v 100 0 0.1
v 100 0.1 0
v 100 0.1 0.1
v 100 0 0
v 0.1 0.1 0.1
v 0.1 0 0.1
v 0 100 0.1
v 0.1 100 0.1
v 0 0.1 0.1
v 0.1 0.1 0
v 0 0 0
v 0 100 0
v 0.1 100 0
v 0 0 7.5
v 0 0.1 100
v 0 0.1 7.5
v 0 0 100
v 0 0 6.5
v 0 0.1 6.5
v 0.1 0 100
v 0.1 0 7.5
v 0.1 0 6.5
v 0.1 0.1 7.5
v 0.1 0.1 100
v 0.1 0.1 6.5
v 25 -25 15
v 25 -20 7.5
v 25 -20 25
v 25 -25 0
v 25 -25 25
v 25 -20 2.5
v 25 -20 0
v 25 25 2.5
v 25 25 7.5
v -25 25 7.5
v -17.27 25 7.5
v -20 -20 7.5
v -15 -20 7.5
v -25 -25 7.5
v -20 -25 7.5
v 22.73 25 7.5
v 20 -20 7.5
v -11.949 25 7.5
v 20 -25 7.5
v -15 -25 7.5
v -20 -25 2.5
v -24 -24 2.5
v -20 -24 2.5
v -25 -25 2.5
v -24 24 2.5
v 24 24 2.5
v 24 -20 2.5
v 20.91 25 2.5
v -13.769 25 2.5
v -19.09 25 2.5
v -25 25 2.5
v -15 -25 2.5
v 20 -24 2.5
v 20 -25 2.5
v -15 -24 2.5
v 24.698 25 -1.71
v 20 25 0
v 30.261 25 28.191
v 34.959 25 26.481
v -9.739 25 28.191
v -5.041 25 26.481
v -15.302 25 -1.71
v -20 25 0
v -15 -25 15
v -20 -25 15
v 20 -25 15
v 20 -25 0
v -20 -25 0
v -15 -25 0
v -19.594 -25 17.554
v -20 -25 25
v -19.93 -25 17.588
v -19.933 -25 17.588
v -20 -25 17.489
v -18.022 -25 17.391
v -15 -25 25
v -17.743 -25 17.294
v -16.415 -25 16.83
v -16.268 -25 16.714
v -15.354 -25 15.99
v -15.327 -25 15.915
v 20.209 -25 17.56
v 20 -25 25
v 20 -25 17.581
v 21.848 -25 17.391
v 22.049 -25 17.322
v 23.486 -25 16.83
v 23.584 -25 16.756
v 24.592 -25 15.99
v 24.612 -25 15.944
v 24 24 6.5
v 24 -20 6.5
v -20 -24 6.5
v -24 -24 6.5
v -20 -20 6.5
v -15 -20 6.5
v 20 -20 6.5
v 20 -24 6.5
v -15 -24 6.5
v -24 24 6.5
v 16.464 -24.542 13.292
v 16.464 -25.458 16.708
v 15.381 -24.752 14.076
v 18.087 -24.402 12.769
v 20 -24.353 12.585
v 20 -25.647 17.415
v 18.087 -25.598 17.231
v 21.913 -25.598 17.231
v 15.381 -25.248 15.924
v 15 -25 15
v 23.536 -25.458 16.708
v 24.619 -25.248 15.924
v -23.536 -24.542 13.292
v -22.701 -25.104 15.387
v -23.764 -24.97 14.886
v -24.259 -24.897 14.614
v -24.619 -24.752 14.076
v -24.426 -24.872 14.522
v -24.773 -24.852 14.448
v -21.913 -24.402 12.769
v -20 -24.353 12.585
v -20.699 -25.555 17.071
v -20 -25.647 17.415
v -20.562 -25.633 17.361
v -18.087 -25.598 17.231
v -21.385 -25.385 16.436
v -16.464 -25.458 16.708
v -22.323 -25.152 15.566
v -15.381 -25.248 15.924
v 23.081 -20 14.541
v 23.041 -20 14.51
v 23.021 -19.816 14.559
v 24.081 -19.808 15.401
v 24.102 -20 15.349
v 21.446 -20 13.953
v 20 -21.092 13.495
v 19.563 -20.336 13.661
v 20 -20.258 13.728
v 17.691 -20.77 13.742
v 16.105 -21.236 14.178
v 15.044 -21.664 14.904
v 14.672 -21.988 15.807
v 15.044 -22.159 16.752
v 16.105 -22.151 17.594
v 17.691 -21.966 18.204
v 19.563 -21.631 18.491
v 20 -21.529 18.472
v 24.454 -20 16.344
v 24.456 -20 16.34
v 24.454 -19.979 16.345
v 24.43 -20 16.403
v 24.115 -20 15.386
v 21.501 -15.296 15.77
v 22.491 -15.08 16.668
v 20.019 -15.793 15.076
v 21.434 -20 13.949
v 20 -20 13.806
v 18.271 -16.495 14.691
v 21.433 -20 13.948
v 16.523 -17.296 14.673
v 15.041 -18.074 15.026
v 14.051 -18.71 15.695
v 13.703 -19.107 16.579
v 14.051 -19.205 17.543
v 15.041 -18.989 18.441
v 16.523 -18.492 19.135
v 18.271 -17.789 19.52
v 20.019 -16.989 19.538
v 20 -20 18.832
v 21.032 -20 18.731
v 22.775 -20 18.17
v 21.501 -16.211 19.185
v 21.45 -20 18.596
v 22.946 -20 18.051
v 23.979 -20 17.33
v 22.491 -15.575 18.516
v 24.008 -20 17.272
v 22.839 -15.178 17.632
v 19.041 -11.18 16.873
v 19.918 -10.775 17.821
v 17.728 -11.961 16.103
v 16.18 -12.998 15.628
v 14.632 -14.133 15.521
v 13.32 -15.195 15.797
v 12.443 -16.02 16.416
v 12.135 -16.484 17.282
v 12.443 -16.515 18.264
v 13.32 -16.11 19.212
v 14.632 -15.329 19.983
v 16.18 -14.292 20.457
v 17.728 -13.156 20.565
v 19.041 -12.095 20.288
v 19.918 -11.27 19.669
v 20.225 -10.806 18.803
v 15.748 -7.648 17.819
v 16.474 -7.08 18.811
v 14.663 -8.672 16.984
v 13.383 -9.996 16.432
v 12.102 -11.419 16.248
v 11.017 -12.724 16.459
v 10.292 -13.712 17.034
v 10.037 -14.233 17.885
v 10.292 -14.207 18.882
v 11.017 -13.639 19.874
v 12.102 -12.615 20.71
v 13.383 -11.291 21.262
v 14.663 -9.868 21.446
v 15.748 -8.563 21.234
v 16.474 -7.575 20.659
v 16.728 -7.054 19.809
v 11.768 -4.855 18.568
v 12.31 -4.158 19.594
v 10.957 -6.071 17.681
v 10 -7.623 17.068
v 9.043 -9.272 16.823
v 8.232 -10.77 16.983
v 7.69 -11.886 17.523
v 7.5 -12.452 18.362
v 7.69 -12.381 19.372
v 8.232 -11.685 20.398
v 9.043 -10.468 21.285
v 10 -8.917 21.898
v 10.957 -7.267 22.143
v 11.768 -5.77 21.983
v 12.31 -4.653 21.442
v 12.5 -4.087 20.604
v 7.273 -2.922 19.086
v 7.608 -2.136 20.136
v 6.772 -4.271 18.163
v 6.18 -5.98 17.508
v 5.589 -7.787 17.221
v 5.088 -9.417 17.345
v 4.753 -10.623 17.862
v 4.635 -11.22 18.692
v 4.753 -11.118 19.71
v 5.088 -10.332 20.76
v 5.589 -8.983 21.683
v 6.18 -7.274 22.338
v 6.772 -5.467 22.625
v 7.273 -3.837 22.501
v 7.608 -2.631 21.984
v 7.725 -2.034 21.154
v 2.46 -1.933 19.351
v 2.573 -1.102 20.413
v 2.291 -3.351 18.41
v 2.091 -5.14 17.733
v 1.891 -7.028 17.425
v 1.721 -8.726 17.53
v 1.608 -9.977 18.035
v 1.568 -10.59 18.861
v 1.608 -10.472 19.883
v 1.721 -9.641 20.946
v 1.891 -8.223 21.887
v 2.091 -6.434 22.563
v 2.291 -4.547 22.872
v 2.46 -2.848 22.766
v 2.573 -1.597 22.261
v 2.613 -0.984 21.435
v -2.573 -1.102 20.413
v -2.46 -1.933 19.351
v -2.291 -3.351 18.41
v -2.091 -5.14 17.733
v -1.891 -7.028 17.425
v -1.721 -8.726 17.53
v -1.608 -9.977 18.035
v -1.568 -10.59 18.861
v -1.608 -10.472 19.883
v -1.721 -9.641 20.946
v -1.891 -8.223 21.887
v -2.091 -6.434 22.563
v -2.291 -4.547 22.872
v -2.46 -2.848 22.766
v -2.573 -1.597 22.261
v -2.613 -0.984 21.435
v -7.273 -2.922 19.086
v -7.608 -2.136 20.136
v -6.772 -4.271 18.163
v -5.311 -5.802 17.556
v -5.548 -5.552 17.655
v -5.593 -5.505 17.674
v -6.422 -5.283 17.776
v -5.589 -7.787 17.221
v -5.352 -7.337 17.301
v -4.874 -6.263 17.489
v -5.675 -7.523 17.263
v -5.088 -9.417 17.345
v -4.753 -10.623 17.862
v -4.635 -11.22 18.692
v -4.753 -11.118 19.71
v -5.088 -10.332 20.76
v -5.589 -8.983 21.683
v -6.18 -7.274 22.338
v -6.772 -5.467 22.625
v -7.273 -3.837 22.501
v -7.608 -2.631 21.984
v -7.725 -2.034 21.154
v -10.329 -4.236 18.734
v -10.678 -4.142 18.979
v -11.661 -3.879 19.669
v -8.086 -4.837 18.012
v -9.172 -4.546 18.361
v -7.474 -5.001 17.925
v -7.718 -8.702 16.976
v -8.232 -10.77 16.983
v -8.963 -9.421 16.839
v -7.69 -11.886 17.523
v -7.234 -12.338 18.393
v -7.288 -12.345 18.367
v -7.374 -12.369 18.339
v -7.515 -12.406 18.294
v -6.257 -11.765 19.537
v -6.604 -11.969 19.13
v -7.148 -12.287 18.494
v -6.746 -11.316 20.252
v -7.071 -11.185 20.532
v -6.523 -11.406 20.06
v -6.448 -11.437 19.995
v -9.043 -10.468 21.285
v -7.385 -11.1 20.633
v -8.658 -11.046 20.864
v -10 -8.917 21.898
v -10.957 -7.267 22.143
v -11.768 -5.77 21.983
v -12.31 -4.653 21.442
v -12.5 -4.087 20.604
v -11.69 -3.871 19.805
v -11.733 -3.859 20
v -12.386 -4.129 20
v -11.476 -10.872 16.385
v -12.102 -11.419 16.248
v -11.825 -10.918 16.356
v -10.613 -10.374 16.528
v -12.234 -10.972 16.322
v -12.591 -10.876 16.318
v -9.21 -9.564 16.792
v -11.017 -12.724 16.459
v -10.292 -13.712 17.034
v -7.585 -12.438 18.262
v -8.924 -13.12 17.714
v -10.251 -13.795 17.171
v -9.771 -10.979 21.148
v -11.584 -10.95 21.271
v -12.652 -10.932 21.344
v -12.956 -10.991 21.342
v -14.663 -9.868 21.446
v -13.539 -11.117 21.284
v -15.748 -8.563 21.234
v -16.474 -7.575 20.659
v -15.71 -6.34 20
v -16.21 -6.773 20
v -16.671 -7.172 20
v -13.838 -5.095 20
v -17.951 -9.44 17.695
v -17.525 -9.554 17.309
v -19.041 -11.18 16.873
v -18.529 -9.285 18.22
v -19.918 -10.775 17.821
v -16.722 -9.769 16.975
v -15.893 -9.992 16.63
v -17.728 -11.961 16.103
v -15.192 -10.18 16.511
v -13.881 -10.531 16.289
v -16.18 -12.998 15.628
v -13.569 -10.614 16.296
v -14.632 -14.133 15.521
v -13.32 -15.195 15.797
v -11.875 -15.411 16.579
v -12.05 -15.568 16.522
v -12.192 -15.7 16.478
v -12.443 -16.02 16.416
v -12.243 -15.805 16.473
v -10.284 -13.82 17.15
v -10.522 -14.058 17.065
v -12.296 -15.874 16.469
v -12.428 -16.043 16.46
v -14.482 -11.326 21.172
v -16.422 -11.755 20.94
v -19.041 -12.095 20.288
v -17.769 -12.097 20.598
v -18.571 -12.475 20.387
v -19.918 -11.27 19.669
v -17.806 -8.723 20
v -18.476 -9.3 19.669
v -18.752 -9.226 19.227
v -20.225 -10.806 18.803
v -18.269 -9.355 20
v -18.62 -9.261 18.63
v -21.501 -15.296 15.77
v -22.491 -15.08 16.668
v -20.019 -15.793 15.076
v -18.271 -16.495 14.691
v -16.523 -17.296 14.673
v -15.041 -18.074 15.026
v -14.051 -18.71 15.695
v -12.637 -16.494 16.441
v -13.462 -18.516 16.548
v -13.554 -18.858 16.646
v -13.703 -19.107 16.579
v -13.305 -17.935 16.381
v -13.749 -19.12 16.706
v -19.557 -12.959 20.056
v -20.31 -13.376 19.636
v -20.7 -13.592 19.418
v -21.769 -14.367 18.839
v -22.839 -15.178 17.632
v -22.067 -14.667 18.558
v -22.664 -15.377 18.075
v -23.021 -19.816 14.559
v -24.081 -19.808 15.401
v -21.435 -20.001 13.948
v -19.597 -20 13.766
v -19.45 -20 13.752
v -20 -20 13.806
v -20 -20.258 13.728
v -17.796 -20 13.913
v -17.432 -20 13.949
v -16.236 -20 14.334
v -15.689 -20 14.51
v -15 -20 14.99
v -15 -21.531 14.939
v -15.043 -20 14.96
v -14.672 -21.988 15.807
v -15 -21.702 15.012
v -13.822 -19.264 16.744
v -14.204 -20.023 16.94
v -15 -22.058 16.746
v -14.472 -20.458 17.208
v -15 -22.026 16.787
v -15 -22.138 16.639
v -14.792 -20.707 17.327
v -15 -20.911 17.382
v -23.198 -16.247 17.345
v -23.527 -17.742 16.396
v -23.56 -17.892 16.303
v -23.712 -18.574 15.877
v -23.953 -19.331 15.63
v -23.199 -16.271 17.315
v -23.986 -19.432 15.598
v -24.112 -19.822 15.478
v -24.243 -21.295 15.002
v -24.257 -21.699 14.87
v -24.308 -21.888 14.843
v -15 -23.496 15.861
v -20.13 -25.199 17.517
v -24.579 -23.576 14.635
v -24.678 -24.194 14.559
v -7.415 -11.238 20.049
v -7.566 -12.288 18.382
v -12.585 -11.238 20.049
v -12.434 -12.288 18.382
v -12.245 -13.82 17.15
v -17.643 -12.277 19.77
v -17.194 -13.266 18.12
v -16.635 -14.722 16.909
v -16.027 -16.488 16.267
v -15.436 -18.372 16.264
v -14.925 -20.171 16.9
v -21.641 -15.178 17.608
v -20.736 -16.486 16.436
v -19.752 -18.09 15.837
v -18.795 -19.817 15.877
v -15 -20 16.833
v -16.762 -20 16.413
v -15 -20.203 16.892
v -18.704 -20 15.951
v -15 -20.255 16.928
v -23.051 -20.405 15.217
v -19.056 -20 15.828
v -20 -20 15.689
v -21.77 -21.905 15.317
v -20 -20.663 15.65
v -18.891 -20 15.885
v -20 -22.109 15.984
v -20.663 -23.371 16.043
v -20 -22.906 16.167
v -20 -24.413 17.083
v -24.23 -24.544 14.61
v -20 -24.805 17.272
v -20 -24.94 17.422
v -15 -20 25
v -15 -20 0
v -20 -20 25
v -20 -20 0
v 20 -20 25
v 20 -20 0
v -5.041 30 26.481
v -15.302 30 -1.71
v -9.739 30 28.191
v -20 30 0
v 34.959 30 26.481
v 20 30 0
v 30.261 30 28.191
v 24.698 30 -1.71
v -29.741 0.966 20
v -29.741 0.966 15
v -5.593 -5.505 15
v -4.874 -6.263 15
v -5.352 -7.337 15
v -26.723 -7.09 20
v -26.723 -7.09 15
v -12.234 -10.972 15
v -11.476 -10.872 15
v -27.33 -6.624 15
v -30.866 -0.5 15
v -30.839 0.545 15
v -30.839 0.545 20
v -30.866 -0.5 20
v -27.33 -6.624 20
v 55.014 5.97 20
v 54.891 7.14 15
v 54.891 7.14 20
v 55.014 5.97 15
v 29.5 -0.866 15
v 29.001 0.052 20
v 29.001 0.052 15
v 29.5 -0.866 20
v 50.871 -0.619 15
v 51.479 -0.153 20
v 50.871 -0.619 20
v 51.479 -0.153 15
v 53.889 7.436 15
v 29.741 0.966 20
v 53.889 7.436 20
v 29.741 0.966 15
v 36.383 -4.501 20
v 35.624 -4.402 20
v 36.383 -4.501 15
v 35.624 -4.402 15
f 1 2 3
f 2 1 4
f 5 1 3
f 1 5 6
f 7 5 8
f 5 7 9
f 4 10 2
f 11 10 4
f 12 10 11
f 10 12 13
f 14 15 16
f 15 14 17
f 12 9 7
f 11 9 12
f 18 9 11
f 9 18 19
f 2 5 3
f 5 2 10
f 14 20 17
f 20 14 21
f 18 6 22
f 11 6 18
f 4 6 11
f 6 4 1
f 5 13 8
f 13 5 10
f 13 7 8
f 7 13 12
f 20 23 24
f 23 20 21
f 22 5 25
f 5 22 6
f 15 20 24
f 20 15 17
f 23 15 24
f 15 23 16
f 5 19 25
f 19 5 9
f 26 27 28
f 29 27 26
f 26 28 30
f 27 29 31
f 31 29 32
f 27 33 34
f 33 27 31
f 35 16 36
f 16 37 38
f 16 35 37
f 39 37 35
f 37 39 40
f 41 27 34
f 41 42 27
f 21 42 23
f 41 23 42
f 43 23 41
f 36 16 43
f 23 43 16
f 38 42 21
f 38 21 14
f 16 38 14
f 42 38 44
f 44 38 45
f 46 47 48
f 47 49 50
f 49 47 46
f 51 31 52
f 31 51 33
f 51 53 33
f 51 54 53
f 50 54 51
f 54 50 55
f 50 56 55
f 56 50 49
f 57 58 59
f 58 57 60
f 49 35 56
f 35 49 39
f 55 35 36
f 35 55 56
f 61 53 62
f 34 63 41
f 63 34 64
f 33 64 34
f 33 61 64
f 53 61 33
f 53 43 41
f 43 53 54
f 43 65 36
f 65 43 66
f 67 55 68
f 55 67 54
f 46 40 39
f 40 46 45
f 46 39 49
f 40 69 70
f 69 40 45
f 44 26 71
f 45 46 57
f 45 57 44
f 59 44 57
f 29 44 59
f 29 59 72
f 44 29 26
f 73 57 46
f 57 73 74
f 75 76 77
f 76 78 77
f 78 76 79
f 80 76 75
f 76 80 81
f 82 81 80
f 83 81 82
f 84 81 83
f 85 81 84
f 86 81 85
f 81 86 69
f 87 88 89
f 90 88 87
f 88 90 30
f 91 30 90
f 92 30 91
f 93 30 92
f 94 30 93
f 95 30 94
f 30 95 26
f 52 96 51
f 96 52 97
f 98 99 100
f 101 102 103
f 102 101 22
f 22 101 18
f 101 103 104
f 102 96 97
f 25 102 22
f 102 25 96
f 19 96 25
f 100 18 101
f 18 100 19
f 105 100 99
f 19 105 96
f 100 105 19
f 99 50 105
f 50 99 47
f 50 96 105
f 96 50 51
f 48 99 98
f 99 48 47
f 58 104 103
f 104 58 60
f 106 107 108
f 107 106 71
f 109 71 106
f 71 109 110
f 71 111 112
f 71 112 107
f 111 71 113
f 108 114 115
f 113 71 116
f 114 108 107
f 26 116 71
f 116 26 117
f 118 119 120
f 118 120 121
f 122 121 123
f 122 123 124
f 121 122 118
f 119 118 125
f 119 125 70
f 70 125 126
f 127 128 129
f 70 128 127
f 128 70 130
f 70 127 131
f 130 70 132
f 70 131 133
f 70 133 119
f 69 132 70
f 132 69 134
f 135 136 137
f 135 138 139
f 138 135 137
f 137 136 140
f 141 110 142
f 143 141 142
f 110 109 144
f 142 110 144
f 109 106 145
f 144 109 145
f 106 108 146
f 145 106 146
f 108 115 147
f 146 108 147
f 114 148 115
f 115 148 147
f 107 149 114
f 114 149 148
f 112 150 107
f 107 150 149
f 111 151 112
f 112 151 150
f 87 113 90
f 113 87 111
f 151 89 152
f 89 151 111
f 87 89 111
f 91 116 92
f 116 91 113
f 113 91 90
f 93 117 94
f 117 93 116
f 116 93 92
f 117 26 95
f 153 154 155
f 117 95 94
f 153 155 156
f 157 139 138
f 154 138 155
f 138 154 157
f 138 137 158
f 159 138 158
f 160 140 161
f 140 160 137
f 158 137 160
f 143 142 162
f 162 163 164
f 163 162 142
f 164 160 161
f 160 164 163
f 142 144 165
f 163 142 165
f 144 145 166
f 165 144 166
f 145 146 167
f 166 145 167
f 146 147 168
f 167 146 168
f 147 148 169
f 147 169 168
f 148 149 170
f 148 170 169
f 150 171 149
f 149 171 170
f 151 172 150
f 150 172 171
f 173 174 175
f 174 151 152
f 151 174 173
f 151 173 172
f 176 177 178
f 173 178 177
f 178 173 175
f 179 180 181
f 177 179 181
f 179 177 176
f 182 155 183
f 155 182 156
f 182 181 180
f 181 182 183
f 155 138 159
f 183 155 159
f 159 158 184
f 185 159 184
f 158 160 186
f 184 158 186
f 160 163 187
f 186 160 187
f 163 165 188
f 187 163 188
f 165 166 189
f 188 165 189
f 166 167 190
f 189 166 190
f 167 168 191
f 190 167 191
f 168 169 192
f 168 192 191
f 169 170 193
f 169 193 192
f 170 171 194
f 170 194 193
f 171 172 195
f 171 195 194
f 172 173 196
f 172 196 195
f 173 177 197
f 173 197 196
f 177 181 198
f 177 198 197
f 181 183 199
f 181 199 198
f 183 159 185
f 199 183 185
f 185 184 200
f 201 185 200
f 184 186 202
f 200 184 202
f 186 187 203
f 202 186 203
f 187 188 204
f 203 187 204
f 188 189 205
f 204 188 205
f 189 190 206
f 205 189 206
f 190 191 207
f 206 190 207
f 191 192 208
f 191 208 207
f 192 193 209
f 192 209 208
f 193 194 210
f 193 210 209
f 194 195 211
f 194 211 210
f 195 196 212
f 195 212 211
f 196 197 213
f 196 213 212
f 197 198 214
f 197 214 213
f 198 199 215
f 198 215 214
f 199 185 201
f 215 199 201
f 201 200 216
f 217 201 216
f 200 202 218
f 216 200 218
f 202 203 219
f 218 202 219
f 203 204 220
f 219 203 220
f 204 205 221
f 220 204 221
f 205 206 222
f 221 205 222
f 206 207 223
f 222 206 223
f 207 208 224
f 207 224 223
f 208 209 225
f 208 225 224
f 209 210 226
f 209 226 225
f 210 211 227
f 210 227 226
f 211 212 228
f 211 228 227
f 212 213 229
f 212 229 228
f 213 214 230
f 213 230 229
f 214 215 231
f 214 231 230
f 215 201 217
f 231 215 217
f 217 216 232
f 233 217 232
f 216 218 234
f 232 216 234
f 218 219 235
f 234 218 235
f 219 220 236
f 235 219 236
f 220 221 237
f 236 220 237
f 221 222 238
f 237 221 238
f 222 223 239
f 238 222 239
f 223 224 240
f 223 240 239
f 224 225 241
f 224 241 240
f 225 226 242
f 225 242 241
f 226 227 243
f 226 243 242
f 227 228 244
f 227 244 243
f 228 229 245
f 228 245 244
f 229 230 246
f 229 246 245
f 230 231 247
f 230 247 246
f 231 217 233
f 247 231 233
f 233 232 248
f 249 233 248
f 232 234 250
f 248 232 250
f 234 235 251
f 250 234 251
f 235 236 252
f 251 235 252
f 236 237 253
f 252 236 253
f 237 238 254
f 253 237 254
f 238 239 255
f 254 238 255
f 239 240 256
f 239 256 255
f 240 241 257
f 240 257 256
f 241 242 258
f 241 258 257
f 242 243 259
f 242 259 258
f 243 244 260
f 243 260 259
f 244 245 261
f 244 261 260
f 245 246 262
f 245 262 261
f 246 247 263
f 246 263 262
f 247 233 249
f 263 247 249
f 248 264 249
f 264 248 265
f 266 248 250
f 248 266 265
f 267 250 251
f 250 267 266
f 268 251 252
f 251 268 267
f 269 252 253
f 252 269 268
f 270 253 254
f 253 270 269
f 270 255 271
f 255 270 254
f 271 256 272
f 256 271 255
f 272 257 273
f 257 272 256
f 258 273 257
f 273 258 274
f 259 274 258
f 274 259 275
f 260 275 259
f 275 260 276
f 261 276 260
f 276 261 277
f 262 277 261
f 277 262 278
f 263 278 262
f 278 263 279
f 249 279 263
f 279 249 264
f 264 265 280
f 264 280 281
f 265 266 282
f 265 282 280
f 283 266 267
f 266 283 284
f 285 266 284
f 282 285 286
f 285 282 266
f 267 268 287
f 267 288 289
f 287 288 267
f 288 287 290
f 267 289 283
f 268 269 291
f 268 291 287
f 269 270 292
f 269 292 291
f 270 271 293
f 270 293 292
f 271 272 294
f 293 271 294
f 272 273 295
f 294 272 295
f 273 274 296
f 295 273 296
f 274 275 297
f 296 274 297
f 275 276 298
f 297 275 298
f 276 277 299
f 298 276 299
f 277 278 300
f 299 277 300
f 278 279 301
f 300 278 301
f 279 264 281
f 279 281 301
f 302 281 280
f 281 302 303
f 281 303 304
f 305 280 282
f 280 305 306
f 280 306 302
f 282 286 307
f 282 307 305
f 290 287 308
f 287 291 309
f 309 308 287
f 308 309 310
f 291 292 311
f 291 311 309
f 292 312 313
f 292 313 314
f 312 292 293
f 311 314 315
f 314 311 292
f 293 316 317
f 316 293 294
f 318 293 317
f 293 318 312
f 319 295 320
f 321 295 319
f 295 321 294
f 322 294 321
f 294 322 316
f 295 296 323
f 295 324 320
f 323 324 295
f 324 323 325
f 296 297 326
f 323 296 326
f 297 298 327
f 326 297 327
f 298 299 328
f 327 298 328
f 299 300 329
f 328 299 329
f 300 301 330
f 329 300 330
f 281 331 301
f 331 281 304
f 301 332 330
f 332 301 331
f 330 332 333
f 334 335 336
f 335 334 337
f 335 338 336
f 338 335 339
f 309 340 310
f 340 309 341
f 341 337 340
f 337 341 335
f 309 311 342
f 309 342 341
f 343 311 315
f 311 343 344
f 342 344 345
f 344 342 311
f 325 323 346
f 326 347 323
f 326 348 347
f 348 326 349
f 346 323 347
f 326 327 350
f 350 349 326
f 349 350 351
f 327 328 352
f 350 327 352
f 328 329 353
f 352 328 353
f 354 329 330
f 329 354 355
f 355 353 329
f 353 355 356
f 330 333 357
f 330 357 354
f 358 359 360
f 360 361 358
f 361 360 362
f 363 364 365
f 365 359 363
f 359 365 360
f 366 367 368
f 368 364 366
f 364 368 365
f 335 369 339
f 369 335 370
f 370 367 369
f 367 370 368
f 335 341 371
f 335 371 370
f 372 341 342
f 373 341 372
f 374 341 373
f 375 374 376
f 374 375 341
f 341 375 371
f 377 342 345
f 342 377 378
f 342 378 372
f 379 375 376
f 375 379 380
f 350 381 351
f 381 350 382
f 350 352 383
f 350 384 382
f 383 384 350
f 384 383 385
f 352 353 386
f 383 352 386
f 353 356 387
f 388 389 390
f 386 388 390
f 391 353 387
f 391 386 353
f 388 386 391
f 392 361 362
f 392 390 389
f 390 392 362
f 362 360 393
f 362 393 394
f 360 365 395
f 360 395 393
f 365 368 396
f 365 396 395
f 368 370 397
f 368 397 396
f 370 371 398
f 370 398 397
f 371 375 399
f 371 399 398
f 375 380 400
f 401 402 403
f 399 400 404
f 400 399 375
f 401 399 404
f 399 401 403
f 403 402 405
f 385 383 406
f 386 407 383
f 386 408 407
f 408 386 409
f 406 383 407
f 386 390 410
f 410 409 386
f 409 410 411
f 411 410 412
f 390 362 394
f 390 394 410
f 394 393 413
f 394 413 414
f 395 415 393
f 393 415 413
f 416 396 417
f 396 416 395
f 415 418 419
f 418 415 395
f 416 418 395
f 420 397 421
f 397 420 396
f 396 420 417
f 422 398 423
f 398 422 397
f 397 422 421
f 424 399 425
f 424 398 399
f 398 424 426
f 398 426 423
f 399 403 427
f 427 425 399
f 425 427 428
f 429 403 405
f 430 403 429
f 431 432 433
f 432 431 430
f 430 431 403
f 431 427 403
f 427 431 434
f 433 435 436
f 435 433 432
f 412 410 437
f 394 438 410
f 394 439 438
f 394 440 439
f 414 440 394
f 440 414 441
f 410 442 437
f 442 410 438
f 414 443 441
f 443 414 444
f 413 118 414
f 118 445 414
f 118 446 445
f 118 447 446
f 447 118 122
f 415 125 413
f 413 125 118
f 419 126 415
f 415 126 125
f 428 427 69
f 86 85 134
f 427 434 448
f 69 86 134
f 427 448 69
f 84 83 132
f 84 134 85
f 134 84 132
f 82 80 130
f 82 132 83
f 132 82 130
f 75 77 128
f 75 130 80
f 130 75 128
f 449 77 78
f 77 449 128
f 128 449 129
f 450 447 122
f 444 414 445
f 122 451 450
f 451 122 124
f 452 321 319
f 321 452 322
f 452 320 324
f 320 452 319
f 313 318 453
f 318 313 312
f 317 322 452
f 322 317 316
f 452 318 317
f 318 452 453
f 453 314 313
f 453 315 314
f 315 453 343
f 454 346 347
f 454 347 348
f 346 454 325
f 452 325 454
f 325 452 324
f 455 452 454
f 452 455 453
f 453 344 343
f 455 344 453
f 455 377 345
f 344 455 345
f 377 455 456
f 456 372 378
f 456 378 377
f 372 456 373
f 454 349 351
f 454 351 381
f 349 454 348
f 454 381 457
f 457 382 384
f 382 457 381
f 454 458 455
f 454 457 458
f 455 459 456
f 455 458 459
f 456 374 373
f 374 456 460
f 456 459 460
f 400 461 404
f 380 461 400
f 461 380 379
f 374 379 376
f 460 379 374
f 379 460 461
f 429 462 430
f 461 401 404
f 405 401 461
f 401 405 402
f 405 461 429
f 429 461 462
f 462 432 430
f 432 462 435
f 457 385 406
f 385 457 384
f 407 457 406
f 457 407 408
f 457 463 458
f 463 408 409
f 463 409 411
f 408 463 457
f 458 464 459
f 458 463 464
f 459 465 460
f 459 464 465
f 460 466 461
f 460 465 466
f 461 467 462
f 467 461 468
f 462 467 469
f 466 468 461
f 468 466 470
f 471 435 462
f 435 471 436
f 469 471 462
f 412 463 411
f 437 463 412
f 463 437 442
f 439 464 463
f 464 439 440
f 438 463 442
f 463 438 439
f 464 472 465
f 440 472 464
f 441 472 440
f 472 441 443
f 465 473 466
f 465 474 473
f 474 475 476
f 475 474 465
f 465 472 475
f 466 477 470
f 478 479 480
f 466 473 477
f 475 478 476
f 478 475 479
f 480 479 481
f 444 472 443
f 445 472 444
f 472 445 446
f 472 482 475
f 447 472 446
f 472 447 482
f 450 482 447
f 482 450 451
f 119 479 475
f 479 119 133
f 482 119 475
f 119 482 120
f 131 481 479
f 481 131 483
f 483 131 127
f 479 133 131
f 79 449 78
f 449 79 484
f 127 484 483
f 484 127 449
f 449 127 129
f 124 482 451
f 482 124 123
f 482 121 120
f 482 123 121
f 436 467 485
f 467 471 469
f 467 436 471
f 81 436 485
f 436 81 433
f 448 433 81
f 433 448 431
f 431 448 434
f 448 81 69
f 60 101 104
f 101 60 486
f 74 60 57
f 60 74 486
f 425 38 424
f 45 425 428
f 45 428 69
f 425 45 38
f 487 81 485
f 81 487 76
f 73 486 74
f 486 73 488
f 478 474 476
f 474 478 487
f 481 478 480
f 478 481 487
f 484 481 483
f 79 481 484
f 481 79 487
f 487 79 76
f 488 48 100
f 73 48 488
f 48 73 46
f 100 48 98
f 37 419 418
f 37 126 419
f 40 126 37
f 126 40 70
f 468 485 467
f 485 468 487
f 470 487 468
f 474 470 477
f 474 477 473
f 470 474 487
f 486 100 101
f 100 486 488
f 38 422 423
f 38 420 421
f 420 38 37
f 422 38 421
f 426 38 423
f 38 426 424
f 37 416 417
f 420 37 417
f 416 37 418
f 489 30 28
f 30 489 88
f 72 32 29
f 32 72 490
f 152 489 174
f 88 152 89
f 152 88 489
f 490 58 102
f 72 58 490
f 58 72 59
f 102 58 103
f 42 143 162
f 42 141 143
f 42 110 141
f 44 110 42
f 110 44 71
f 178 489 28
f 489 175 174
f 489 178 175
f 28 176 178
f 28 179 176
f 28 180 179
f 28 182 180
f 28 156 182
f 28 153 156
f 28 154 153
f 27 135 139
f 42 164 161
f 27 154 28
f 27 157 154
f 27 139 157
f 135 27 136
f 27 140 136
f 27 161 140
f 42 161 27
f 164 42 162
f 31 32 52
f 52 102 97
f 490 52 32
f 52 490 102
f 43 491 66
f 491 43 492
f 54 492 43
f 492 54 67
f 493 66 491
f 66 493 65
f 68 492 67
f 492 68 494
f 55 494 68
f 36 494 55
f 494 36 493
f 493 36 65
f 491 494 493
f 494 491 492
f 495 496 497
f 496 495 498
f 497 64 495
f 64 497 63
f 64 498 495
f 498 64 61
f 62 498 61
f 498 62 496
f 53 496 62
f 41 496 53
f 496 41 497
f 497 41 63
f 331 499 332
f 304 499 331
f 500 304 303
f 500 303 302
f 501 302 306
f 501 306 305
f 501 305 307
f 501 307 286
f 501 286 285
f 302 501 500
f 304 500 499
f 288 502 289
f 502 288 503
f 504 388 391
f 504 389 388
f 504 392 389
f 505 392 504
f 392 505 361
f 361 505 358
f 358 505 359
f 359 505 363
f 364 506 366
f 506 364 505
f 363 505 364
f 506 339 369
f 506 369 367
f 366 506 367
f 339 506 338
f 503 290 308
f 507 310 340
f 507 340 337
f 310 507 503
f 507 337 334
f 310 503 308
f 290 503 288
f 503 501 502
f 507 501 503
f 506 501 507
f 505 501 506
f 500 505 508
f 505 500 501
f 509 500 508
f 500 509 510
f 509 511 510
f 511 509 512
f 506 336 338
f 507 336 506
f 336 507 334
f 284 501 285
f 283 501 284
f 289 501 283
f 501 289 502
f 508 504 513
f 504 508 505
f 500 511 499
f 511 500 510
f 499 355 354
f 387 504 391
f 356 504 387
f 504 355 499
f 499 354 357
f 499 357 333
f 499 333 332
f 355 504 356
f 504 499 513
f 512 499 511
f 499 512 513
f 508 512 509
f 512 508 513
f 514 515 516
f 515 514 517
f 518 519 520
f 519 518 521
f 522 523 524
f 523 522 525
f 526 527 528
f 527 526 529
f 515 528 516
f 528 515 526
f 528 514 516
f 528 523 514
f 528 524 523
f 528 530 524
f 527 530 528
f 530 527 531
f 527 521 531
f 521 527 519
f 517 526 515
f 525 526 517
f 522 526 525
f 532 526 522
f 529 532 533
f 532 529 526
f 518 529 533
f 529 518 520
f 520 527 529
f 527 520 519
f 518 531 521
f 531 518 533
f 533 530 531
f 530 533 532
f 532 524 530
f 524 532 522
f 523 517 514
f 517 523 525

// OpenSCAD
    // Combined Scene

    // Permanent Model
    
    // Permanent Model (Black)
    color([0, 0, 0]) {
        // Your permanent model code here
        cube([100,0.1,0.1], center = false);
        cube([0.1,100,0.1], center = false);
        cube([0.1,0.1,100], center = false);
    }
    

    // Dynamic Model
    union() {
    // Define the seat of the chair with a broader shape for comfort
    translate([0, 0, 5])
    difference() {
        scale([1, 1, 0.5])
        cube([50, 50, 10], center=true);
        translate([0, 0, -1])
        scale([1, 1, 0.5])
        cube([48, 48, 10], center=true);
    }

    // Create an ergonomic backrest with a distinct curve
    translate([0, -25, 15])
    rotate([15, 0, 0])
    difference() {
        scale([1, 1, 0.5])
        rotate_extrude(angle=180)
        translate([20, 0, 0])
        circle(r=5);
        translate([-10, -10, 5])
        rotate_extrude(angle=180)
        translate([20, 0, 0])
        circle(r=6);
    }

    // Design functional, straight legs for stability
    for (x = [-20, 20]) {
        translate([x, -25, 0])
        cube([5, 5, 25], center=false);
    }

    // Adding the rear legs with a slight angle for aesthetics
    for (x = [-20, 20]) {
        translate([x, 25, 0])
        rotate([0, 20, 0])
        cube([5, 5, 30], center=false);
    }

    // Optional armrests, designed to enhance comfort
    for (x = [-30, 30]) {
        translate([x, 0, 15])
        rotate([0, 0, 15 * sign(x)])
        linear_extrude(height=5)
        offset(r=1) {
            polygon(points=[[0,0], [25,0], [20,-5], [5,-5]]);
        }
    }
}
    
